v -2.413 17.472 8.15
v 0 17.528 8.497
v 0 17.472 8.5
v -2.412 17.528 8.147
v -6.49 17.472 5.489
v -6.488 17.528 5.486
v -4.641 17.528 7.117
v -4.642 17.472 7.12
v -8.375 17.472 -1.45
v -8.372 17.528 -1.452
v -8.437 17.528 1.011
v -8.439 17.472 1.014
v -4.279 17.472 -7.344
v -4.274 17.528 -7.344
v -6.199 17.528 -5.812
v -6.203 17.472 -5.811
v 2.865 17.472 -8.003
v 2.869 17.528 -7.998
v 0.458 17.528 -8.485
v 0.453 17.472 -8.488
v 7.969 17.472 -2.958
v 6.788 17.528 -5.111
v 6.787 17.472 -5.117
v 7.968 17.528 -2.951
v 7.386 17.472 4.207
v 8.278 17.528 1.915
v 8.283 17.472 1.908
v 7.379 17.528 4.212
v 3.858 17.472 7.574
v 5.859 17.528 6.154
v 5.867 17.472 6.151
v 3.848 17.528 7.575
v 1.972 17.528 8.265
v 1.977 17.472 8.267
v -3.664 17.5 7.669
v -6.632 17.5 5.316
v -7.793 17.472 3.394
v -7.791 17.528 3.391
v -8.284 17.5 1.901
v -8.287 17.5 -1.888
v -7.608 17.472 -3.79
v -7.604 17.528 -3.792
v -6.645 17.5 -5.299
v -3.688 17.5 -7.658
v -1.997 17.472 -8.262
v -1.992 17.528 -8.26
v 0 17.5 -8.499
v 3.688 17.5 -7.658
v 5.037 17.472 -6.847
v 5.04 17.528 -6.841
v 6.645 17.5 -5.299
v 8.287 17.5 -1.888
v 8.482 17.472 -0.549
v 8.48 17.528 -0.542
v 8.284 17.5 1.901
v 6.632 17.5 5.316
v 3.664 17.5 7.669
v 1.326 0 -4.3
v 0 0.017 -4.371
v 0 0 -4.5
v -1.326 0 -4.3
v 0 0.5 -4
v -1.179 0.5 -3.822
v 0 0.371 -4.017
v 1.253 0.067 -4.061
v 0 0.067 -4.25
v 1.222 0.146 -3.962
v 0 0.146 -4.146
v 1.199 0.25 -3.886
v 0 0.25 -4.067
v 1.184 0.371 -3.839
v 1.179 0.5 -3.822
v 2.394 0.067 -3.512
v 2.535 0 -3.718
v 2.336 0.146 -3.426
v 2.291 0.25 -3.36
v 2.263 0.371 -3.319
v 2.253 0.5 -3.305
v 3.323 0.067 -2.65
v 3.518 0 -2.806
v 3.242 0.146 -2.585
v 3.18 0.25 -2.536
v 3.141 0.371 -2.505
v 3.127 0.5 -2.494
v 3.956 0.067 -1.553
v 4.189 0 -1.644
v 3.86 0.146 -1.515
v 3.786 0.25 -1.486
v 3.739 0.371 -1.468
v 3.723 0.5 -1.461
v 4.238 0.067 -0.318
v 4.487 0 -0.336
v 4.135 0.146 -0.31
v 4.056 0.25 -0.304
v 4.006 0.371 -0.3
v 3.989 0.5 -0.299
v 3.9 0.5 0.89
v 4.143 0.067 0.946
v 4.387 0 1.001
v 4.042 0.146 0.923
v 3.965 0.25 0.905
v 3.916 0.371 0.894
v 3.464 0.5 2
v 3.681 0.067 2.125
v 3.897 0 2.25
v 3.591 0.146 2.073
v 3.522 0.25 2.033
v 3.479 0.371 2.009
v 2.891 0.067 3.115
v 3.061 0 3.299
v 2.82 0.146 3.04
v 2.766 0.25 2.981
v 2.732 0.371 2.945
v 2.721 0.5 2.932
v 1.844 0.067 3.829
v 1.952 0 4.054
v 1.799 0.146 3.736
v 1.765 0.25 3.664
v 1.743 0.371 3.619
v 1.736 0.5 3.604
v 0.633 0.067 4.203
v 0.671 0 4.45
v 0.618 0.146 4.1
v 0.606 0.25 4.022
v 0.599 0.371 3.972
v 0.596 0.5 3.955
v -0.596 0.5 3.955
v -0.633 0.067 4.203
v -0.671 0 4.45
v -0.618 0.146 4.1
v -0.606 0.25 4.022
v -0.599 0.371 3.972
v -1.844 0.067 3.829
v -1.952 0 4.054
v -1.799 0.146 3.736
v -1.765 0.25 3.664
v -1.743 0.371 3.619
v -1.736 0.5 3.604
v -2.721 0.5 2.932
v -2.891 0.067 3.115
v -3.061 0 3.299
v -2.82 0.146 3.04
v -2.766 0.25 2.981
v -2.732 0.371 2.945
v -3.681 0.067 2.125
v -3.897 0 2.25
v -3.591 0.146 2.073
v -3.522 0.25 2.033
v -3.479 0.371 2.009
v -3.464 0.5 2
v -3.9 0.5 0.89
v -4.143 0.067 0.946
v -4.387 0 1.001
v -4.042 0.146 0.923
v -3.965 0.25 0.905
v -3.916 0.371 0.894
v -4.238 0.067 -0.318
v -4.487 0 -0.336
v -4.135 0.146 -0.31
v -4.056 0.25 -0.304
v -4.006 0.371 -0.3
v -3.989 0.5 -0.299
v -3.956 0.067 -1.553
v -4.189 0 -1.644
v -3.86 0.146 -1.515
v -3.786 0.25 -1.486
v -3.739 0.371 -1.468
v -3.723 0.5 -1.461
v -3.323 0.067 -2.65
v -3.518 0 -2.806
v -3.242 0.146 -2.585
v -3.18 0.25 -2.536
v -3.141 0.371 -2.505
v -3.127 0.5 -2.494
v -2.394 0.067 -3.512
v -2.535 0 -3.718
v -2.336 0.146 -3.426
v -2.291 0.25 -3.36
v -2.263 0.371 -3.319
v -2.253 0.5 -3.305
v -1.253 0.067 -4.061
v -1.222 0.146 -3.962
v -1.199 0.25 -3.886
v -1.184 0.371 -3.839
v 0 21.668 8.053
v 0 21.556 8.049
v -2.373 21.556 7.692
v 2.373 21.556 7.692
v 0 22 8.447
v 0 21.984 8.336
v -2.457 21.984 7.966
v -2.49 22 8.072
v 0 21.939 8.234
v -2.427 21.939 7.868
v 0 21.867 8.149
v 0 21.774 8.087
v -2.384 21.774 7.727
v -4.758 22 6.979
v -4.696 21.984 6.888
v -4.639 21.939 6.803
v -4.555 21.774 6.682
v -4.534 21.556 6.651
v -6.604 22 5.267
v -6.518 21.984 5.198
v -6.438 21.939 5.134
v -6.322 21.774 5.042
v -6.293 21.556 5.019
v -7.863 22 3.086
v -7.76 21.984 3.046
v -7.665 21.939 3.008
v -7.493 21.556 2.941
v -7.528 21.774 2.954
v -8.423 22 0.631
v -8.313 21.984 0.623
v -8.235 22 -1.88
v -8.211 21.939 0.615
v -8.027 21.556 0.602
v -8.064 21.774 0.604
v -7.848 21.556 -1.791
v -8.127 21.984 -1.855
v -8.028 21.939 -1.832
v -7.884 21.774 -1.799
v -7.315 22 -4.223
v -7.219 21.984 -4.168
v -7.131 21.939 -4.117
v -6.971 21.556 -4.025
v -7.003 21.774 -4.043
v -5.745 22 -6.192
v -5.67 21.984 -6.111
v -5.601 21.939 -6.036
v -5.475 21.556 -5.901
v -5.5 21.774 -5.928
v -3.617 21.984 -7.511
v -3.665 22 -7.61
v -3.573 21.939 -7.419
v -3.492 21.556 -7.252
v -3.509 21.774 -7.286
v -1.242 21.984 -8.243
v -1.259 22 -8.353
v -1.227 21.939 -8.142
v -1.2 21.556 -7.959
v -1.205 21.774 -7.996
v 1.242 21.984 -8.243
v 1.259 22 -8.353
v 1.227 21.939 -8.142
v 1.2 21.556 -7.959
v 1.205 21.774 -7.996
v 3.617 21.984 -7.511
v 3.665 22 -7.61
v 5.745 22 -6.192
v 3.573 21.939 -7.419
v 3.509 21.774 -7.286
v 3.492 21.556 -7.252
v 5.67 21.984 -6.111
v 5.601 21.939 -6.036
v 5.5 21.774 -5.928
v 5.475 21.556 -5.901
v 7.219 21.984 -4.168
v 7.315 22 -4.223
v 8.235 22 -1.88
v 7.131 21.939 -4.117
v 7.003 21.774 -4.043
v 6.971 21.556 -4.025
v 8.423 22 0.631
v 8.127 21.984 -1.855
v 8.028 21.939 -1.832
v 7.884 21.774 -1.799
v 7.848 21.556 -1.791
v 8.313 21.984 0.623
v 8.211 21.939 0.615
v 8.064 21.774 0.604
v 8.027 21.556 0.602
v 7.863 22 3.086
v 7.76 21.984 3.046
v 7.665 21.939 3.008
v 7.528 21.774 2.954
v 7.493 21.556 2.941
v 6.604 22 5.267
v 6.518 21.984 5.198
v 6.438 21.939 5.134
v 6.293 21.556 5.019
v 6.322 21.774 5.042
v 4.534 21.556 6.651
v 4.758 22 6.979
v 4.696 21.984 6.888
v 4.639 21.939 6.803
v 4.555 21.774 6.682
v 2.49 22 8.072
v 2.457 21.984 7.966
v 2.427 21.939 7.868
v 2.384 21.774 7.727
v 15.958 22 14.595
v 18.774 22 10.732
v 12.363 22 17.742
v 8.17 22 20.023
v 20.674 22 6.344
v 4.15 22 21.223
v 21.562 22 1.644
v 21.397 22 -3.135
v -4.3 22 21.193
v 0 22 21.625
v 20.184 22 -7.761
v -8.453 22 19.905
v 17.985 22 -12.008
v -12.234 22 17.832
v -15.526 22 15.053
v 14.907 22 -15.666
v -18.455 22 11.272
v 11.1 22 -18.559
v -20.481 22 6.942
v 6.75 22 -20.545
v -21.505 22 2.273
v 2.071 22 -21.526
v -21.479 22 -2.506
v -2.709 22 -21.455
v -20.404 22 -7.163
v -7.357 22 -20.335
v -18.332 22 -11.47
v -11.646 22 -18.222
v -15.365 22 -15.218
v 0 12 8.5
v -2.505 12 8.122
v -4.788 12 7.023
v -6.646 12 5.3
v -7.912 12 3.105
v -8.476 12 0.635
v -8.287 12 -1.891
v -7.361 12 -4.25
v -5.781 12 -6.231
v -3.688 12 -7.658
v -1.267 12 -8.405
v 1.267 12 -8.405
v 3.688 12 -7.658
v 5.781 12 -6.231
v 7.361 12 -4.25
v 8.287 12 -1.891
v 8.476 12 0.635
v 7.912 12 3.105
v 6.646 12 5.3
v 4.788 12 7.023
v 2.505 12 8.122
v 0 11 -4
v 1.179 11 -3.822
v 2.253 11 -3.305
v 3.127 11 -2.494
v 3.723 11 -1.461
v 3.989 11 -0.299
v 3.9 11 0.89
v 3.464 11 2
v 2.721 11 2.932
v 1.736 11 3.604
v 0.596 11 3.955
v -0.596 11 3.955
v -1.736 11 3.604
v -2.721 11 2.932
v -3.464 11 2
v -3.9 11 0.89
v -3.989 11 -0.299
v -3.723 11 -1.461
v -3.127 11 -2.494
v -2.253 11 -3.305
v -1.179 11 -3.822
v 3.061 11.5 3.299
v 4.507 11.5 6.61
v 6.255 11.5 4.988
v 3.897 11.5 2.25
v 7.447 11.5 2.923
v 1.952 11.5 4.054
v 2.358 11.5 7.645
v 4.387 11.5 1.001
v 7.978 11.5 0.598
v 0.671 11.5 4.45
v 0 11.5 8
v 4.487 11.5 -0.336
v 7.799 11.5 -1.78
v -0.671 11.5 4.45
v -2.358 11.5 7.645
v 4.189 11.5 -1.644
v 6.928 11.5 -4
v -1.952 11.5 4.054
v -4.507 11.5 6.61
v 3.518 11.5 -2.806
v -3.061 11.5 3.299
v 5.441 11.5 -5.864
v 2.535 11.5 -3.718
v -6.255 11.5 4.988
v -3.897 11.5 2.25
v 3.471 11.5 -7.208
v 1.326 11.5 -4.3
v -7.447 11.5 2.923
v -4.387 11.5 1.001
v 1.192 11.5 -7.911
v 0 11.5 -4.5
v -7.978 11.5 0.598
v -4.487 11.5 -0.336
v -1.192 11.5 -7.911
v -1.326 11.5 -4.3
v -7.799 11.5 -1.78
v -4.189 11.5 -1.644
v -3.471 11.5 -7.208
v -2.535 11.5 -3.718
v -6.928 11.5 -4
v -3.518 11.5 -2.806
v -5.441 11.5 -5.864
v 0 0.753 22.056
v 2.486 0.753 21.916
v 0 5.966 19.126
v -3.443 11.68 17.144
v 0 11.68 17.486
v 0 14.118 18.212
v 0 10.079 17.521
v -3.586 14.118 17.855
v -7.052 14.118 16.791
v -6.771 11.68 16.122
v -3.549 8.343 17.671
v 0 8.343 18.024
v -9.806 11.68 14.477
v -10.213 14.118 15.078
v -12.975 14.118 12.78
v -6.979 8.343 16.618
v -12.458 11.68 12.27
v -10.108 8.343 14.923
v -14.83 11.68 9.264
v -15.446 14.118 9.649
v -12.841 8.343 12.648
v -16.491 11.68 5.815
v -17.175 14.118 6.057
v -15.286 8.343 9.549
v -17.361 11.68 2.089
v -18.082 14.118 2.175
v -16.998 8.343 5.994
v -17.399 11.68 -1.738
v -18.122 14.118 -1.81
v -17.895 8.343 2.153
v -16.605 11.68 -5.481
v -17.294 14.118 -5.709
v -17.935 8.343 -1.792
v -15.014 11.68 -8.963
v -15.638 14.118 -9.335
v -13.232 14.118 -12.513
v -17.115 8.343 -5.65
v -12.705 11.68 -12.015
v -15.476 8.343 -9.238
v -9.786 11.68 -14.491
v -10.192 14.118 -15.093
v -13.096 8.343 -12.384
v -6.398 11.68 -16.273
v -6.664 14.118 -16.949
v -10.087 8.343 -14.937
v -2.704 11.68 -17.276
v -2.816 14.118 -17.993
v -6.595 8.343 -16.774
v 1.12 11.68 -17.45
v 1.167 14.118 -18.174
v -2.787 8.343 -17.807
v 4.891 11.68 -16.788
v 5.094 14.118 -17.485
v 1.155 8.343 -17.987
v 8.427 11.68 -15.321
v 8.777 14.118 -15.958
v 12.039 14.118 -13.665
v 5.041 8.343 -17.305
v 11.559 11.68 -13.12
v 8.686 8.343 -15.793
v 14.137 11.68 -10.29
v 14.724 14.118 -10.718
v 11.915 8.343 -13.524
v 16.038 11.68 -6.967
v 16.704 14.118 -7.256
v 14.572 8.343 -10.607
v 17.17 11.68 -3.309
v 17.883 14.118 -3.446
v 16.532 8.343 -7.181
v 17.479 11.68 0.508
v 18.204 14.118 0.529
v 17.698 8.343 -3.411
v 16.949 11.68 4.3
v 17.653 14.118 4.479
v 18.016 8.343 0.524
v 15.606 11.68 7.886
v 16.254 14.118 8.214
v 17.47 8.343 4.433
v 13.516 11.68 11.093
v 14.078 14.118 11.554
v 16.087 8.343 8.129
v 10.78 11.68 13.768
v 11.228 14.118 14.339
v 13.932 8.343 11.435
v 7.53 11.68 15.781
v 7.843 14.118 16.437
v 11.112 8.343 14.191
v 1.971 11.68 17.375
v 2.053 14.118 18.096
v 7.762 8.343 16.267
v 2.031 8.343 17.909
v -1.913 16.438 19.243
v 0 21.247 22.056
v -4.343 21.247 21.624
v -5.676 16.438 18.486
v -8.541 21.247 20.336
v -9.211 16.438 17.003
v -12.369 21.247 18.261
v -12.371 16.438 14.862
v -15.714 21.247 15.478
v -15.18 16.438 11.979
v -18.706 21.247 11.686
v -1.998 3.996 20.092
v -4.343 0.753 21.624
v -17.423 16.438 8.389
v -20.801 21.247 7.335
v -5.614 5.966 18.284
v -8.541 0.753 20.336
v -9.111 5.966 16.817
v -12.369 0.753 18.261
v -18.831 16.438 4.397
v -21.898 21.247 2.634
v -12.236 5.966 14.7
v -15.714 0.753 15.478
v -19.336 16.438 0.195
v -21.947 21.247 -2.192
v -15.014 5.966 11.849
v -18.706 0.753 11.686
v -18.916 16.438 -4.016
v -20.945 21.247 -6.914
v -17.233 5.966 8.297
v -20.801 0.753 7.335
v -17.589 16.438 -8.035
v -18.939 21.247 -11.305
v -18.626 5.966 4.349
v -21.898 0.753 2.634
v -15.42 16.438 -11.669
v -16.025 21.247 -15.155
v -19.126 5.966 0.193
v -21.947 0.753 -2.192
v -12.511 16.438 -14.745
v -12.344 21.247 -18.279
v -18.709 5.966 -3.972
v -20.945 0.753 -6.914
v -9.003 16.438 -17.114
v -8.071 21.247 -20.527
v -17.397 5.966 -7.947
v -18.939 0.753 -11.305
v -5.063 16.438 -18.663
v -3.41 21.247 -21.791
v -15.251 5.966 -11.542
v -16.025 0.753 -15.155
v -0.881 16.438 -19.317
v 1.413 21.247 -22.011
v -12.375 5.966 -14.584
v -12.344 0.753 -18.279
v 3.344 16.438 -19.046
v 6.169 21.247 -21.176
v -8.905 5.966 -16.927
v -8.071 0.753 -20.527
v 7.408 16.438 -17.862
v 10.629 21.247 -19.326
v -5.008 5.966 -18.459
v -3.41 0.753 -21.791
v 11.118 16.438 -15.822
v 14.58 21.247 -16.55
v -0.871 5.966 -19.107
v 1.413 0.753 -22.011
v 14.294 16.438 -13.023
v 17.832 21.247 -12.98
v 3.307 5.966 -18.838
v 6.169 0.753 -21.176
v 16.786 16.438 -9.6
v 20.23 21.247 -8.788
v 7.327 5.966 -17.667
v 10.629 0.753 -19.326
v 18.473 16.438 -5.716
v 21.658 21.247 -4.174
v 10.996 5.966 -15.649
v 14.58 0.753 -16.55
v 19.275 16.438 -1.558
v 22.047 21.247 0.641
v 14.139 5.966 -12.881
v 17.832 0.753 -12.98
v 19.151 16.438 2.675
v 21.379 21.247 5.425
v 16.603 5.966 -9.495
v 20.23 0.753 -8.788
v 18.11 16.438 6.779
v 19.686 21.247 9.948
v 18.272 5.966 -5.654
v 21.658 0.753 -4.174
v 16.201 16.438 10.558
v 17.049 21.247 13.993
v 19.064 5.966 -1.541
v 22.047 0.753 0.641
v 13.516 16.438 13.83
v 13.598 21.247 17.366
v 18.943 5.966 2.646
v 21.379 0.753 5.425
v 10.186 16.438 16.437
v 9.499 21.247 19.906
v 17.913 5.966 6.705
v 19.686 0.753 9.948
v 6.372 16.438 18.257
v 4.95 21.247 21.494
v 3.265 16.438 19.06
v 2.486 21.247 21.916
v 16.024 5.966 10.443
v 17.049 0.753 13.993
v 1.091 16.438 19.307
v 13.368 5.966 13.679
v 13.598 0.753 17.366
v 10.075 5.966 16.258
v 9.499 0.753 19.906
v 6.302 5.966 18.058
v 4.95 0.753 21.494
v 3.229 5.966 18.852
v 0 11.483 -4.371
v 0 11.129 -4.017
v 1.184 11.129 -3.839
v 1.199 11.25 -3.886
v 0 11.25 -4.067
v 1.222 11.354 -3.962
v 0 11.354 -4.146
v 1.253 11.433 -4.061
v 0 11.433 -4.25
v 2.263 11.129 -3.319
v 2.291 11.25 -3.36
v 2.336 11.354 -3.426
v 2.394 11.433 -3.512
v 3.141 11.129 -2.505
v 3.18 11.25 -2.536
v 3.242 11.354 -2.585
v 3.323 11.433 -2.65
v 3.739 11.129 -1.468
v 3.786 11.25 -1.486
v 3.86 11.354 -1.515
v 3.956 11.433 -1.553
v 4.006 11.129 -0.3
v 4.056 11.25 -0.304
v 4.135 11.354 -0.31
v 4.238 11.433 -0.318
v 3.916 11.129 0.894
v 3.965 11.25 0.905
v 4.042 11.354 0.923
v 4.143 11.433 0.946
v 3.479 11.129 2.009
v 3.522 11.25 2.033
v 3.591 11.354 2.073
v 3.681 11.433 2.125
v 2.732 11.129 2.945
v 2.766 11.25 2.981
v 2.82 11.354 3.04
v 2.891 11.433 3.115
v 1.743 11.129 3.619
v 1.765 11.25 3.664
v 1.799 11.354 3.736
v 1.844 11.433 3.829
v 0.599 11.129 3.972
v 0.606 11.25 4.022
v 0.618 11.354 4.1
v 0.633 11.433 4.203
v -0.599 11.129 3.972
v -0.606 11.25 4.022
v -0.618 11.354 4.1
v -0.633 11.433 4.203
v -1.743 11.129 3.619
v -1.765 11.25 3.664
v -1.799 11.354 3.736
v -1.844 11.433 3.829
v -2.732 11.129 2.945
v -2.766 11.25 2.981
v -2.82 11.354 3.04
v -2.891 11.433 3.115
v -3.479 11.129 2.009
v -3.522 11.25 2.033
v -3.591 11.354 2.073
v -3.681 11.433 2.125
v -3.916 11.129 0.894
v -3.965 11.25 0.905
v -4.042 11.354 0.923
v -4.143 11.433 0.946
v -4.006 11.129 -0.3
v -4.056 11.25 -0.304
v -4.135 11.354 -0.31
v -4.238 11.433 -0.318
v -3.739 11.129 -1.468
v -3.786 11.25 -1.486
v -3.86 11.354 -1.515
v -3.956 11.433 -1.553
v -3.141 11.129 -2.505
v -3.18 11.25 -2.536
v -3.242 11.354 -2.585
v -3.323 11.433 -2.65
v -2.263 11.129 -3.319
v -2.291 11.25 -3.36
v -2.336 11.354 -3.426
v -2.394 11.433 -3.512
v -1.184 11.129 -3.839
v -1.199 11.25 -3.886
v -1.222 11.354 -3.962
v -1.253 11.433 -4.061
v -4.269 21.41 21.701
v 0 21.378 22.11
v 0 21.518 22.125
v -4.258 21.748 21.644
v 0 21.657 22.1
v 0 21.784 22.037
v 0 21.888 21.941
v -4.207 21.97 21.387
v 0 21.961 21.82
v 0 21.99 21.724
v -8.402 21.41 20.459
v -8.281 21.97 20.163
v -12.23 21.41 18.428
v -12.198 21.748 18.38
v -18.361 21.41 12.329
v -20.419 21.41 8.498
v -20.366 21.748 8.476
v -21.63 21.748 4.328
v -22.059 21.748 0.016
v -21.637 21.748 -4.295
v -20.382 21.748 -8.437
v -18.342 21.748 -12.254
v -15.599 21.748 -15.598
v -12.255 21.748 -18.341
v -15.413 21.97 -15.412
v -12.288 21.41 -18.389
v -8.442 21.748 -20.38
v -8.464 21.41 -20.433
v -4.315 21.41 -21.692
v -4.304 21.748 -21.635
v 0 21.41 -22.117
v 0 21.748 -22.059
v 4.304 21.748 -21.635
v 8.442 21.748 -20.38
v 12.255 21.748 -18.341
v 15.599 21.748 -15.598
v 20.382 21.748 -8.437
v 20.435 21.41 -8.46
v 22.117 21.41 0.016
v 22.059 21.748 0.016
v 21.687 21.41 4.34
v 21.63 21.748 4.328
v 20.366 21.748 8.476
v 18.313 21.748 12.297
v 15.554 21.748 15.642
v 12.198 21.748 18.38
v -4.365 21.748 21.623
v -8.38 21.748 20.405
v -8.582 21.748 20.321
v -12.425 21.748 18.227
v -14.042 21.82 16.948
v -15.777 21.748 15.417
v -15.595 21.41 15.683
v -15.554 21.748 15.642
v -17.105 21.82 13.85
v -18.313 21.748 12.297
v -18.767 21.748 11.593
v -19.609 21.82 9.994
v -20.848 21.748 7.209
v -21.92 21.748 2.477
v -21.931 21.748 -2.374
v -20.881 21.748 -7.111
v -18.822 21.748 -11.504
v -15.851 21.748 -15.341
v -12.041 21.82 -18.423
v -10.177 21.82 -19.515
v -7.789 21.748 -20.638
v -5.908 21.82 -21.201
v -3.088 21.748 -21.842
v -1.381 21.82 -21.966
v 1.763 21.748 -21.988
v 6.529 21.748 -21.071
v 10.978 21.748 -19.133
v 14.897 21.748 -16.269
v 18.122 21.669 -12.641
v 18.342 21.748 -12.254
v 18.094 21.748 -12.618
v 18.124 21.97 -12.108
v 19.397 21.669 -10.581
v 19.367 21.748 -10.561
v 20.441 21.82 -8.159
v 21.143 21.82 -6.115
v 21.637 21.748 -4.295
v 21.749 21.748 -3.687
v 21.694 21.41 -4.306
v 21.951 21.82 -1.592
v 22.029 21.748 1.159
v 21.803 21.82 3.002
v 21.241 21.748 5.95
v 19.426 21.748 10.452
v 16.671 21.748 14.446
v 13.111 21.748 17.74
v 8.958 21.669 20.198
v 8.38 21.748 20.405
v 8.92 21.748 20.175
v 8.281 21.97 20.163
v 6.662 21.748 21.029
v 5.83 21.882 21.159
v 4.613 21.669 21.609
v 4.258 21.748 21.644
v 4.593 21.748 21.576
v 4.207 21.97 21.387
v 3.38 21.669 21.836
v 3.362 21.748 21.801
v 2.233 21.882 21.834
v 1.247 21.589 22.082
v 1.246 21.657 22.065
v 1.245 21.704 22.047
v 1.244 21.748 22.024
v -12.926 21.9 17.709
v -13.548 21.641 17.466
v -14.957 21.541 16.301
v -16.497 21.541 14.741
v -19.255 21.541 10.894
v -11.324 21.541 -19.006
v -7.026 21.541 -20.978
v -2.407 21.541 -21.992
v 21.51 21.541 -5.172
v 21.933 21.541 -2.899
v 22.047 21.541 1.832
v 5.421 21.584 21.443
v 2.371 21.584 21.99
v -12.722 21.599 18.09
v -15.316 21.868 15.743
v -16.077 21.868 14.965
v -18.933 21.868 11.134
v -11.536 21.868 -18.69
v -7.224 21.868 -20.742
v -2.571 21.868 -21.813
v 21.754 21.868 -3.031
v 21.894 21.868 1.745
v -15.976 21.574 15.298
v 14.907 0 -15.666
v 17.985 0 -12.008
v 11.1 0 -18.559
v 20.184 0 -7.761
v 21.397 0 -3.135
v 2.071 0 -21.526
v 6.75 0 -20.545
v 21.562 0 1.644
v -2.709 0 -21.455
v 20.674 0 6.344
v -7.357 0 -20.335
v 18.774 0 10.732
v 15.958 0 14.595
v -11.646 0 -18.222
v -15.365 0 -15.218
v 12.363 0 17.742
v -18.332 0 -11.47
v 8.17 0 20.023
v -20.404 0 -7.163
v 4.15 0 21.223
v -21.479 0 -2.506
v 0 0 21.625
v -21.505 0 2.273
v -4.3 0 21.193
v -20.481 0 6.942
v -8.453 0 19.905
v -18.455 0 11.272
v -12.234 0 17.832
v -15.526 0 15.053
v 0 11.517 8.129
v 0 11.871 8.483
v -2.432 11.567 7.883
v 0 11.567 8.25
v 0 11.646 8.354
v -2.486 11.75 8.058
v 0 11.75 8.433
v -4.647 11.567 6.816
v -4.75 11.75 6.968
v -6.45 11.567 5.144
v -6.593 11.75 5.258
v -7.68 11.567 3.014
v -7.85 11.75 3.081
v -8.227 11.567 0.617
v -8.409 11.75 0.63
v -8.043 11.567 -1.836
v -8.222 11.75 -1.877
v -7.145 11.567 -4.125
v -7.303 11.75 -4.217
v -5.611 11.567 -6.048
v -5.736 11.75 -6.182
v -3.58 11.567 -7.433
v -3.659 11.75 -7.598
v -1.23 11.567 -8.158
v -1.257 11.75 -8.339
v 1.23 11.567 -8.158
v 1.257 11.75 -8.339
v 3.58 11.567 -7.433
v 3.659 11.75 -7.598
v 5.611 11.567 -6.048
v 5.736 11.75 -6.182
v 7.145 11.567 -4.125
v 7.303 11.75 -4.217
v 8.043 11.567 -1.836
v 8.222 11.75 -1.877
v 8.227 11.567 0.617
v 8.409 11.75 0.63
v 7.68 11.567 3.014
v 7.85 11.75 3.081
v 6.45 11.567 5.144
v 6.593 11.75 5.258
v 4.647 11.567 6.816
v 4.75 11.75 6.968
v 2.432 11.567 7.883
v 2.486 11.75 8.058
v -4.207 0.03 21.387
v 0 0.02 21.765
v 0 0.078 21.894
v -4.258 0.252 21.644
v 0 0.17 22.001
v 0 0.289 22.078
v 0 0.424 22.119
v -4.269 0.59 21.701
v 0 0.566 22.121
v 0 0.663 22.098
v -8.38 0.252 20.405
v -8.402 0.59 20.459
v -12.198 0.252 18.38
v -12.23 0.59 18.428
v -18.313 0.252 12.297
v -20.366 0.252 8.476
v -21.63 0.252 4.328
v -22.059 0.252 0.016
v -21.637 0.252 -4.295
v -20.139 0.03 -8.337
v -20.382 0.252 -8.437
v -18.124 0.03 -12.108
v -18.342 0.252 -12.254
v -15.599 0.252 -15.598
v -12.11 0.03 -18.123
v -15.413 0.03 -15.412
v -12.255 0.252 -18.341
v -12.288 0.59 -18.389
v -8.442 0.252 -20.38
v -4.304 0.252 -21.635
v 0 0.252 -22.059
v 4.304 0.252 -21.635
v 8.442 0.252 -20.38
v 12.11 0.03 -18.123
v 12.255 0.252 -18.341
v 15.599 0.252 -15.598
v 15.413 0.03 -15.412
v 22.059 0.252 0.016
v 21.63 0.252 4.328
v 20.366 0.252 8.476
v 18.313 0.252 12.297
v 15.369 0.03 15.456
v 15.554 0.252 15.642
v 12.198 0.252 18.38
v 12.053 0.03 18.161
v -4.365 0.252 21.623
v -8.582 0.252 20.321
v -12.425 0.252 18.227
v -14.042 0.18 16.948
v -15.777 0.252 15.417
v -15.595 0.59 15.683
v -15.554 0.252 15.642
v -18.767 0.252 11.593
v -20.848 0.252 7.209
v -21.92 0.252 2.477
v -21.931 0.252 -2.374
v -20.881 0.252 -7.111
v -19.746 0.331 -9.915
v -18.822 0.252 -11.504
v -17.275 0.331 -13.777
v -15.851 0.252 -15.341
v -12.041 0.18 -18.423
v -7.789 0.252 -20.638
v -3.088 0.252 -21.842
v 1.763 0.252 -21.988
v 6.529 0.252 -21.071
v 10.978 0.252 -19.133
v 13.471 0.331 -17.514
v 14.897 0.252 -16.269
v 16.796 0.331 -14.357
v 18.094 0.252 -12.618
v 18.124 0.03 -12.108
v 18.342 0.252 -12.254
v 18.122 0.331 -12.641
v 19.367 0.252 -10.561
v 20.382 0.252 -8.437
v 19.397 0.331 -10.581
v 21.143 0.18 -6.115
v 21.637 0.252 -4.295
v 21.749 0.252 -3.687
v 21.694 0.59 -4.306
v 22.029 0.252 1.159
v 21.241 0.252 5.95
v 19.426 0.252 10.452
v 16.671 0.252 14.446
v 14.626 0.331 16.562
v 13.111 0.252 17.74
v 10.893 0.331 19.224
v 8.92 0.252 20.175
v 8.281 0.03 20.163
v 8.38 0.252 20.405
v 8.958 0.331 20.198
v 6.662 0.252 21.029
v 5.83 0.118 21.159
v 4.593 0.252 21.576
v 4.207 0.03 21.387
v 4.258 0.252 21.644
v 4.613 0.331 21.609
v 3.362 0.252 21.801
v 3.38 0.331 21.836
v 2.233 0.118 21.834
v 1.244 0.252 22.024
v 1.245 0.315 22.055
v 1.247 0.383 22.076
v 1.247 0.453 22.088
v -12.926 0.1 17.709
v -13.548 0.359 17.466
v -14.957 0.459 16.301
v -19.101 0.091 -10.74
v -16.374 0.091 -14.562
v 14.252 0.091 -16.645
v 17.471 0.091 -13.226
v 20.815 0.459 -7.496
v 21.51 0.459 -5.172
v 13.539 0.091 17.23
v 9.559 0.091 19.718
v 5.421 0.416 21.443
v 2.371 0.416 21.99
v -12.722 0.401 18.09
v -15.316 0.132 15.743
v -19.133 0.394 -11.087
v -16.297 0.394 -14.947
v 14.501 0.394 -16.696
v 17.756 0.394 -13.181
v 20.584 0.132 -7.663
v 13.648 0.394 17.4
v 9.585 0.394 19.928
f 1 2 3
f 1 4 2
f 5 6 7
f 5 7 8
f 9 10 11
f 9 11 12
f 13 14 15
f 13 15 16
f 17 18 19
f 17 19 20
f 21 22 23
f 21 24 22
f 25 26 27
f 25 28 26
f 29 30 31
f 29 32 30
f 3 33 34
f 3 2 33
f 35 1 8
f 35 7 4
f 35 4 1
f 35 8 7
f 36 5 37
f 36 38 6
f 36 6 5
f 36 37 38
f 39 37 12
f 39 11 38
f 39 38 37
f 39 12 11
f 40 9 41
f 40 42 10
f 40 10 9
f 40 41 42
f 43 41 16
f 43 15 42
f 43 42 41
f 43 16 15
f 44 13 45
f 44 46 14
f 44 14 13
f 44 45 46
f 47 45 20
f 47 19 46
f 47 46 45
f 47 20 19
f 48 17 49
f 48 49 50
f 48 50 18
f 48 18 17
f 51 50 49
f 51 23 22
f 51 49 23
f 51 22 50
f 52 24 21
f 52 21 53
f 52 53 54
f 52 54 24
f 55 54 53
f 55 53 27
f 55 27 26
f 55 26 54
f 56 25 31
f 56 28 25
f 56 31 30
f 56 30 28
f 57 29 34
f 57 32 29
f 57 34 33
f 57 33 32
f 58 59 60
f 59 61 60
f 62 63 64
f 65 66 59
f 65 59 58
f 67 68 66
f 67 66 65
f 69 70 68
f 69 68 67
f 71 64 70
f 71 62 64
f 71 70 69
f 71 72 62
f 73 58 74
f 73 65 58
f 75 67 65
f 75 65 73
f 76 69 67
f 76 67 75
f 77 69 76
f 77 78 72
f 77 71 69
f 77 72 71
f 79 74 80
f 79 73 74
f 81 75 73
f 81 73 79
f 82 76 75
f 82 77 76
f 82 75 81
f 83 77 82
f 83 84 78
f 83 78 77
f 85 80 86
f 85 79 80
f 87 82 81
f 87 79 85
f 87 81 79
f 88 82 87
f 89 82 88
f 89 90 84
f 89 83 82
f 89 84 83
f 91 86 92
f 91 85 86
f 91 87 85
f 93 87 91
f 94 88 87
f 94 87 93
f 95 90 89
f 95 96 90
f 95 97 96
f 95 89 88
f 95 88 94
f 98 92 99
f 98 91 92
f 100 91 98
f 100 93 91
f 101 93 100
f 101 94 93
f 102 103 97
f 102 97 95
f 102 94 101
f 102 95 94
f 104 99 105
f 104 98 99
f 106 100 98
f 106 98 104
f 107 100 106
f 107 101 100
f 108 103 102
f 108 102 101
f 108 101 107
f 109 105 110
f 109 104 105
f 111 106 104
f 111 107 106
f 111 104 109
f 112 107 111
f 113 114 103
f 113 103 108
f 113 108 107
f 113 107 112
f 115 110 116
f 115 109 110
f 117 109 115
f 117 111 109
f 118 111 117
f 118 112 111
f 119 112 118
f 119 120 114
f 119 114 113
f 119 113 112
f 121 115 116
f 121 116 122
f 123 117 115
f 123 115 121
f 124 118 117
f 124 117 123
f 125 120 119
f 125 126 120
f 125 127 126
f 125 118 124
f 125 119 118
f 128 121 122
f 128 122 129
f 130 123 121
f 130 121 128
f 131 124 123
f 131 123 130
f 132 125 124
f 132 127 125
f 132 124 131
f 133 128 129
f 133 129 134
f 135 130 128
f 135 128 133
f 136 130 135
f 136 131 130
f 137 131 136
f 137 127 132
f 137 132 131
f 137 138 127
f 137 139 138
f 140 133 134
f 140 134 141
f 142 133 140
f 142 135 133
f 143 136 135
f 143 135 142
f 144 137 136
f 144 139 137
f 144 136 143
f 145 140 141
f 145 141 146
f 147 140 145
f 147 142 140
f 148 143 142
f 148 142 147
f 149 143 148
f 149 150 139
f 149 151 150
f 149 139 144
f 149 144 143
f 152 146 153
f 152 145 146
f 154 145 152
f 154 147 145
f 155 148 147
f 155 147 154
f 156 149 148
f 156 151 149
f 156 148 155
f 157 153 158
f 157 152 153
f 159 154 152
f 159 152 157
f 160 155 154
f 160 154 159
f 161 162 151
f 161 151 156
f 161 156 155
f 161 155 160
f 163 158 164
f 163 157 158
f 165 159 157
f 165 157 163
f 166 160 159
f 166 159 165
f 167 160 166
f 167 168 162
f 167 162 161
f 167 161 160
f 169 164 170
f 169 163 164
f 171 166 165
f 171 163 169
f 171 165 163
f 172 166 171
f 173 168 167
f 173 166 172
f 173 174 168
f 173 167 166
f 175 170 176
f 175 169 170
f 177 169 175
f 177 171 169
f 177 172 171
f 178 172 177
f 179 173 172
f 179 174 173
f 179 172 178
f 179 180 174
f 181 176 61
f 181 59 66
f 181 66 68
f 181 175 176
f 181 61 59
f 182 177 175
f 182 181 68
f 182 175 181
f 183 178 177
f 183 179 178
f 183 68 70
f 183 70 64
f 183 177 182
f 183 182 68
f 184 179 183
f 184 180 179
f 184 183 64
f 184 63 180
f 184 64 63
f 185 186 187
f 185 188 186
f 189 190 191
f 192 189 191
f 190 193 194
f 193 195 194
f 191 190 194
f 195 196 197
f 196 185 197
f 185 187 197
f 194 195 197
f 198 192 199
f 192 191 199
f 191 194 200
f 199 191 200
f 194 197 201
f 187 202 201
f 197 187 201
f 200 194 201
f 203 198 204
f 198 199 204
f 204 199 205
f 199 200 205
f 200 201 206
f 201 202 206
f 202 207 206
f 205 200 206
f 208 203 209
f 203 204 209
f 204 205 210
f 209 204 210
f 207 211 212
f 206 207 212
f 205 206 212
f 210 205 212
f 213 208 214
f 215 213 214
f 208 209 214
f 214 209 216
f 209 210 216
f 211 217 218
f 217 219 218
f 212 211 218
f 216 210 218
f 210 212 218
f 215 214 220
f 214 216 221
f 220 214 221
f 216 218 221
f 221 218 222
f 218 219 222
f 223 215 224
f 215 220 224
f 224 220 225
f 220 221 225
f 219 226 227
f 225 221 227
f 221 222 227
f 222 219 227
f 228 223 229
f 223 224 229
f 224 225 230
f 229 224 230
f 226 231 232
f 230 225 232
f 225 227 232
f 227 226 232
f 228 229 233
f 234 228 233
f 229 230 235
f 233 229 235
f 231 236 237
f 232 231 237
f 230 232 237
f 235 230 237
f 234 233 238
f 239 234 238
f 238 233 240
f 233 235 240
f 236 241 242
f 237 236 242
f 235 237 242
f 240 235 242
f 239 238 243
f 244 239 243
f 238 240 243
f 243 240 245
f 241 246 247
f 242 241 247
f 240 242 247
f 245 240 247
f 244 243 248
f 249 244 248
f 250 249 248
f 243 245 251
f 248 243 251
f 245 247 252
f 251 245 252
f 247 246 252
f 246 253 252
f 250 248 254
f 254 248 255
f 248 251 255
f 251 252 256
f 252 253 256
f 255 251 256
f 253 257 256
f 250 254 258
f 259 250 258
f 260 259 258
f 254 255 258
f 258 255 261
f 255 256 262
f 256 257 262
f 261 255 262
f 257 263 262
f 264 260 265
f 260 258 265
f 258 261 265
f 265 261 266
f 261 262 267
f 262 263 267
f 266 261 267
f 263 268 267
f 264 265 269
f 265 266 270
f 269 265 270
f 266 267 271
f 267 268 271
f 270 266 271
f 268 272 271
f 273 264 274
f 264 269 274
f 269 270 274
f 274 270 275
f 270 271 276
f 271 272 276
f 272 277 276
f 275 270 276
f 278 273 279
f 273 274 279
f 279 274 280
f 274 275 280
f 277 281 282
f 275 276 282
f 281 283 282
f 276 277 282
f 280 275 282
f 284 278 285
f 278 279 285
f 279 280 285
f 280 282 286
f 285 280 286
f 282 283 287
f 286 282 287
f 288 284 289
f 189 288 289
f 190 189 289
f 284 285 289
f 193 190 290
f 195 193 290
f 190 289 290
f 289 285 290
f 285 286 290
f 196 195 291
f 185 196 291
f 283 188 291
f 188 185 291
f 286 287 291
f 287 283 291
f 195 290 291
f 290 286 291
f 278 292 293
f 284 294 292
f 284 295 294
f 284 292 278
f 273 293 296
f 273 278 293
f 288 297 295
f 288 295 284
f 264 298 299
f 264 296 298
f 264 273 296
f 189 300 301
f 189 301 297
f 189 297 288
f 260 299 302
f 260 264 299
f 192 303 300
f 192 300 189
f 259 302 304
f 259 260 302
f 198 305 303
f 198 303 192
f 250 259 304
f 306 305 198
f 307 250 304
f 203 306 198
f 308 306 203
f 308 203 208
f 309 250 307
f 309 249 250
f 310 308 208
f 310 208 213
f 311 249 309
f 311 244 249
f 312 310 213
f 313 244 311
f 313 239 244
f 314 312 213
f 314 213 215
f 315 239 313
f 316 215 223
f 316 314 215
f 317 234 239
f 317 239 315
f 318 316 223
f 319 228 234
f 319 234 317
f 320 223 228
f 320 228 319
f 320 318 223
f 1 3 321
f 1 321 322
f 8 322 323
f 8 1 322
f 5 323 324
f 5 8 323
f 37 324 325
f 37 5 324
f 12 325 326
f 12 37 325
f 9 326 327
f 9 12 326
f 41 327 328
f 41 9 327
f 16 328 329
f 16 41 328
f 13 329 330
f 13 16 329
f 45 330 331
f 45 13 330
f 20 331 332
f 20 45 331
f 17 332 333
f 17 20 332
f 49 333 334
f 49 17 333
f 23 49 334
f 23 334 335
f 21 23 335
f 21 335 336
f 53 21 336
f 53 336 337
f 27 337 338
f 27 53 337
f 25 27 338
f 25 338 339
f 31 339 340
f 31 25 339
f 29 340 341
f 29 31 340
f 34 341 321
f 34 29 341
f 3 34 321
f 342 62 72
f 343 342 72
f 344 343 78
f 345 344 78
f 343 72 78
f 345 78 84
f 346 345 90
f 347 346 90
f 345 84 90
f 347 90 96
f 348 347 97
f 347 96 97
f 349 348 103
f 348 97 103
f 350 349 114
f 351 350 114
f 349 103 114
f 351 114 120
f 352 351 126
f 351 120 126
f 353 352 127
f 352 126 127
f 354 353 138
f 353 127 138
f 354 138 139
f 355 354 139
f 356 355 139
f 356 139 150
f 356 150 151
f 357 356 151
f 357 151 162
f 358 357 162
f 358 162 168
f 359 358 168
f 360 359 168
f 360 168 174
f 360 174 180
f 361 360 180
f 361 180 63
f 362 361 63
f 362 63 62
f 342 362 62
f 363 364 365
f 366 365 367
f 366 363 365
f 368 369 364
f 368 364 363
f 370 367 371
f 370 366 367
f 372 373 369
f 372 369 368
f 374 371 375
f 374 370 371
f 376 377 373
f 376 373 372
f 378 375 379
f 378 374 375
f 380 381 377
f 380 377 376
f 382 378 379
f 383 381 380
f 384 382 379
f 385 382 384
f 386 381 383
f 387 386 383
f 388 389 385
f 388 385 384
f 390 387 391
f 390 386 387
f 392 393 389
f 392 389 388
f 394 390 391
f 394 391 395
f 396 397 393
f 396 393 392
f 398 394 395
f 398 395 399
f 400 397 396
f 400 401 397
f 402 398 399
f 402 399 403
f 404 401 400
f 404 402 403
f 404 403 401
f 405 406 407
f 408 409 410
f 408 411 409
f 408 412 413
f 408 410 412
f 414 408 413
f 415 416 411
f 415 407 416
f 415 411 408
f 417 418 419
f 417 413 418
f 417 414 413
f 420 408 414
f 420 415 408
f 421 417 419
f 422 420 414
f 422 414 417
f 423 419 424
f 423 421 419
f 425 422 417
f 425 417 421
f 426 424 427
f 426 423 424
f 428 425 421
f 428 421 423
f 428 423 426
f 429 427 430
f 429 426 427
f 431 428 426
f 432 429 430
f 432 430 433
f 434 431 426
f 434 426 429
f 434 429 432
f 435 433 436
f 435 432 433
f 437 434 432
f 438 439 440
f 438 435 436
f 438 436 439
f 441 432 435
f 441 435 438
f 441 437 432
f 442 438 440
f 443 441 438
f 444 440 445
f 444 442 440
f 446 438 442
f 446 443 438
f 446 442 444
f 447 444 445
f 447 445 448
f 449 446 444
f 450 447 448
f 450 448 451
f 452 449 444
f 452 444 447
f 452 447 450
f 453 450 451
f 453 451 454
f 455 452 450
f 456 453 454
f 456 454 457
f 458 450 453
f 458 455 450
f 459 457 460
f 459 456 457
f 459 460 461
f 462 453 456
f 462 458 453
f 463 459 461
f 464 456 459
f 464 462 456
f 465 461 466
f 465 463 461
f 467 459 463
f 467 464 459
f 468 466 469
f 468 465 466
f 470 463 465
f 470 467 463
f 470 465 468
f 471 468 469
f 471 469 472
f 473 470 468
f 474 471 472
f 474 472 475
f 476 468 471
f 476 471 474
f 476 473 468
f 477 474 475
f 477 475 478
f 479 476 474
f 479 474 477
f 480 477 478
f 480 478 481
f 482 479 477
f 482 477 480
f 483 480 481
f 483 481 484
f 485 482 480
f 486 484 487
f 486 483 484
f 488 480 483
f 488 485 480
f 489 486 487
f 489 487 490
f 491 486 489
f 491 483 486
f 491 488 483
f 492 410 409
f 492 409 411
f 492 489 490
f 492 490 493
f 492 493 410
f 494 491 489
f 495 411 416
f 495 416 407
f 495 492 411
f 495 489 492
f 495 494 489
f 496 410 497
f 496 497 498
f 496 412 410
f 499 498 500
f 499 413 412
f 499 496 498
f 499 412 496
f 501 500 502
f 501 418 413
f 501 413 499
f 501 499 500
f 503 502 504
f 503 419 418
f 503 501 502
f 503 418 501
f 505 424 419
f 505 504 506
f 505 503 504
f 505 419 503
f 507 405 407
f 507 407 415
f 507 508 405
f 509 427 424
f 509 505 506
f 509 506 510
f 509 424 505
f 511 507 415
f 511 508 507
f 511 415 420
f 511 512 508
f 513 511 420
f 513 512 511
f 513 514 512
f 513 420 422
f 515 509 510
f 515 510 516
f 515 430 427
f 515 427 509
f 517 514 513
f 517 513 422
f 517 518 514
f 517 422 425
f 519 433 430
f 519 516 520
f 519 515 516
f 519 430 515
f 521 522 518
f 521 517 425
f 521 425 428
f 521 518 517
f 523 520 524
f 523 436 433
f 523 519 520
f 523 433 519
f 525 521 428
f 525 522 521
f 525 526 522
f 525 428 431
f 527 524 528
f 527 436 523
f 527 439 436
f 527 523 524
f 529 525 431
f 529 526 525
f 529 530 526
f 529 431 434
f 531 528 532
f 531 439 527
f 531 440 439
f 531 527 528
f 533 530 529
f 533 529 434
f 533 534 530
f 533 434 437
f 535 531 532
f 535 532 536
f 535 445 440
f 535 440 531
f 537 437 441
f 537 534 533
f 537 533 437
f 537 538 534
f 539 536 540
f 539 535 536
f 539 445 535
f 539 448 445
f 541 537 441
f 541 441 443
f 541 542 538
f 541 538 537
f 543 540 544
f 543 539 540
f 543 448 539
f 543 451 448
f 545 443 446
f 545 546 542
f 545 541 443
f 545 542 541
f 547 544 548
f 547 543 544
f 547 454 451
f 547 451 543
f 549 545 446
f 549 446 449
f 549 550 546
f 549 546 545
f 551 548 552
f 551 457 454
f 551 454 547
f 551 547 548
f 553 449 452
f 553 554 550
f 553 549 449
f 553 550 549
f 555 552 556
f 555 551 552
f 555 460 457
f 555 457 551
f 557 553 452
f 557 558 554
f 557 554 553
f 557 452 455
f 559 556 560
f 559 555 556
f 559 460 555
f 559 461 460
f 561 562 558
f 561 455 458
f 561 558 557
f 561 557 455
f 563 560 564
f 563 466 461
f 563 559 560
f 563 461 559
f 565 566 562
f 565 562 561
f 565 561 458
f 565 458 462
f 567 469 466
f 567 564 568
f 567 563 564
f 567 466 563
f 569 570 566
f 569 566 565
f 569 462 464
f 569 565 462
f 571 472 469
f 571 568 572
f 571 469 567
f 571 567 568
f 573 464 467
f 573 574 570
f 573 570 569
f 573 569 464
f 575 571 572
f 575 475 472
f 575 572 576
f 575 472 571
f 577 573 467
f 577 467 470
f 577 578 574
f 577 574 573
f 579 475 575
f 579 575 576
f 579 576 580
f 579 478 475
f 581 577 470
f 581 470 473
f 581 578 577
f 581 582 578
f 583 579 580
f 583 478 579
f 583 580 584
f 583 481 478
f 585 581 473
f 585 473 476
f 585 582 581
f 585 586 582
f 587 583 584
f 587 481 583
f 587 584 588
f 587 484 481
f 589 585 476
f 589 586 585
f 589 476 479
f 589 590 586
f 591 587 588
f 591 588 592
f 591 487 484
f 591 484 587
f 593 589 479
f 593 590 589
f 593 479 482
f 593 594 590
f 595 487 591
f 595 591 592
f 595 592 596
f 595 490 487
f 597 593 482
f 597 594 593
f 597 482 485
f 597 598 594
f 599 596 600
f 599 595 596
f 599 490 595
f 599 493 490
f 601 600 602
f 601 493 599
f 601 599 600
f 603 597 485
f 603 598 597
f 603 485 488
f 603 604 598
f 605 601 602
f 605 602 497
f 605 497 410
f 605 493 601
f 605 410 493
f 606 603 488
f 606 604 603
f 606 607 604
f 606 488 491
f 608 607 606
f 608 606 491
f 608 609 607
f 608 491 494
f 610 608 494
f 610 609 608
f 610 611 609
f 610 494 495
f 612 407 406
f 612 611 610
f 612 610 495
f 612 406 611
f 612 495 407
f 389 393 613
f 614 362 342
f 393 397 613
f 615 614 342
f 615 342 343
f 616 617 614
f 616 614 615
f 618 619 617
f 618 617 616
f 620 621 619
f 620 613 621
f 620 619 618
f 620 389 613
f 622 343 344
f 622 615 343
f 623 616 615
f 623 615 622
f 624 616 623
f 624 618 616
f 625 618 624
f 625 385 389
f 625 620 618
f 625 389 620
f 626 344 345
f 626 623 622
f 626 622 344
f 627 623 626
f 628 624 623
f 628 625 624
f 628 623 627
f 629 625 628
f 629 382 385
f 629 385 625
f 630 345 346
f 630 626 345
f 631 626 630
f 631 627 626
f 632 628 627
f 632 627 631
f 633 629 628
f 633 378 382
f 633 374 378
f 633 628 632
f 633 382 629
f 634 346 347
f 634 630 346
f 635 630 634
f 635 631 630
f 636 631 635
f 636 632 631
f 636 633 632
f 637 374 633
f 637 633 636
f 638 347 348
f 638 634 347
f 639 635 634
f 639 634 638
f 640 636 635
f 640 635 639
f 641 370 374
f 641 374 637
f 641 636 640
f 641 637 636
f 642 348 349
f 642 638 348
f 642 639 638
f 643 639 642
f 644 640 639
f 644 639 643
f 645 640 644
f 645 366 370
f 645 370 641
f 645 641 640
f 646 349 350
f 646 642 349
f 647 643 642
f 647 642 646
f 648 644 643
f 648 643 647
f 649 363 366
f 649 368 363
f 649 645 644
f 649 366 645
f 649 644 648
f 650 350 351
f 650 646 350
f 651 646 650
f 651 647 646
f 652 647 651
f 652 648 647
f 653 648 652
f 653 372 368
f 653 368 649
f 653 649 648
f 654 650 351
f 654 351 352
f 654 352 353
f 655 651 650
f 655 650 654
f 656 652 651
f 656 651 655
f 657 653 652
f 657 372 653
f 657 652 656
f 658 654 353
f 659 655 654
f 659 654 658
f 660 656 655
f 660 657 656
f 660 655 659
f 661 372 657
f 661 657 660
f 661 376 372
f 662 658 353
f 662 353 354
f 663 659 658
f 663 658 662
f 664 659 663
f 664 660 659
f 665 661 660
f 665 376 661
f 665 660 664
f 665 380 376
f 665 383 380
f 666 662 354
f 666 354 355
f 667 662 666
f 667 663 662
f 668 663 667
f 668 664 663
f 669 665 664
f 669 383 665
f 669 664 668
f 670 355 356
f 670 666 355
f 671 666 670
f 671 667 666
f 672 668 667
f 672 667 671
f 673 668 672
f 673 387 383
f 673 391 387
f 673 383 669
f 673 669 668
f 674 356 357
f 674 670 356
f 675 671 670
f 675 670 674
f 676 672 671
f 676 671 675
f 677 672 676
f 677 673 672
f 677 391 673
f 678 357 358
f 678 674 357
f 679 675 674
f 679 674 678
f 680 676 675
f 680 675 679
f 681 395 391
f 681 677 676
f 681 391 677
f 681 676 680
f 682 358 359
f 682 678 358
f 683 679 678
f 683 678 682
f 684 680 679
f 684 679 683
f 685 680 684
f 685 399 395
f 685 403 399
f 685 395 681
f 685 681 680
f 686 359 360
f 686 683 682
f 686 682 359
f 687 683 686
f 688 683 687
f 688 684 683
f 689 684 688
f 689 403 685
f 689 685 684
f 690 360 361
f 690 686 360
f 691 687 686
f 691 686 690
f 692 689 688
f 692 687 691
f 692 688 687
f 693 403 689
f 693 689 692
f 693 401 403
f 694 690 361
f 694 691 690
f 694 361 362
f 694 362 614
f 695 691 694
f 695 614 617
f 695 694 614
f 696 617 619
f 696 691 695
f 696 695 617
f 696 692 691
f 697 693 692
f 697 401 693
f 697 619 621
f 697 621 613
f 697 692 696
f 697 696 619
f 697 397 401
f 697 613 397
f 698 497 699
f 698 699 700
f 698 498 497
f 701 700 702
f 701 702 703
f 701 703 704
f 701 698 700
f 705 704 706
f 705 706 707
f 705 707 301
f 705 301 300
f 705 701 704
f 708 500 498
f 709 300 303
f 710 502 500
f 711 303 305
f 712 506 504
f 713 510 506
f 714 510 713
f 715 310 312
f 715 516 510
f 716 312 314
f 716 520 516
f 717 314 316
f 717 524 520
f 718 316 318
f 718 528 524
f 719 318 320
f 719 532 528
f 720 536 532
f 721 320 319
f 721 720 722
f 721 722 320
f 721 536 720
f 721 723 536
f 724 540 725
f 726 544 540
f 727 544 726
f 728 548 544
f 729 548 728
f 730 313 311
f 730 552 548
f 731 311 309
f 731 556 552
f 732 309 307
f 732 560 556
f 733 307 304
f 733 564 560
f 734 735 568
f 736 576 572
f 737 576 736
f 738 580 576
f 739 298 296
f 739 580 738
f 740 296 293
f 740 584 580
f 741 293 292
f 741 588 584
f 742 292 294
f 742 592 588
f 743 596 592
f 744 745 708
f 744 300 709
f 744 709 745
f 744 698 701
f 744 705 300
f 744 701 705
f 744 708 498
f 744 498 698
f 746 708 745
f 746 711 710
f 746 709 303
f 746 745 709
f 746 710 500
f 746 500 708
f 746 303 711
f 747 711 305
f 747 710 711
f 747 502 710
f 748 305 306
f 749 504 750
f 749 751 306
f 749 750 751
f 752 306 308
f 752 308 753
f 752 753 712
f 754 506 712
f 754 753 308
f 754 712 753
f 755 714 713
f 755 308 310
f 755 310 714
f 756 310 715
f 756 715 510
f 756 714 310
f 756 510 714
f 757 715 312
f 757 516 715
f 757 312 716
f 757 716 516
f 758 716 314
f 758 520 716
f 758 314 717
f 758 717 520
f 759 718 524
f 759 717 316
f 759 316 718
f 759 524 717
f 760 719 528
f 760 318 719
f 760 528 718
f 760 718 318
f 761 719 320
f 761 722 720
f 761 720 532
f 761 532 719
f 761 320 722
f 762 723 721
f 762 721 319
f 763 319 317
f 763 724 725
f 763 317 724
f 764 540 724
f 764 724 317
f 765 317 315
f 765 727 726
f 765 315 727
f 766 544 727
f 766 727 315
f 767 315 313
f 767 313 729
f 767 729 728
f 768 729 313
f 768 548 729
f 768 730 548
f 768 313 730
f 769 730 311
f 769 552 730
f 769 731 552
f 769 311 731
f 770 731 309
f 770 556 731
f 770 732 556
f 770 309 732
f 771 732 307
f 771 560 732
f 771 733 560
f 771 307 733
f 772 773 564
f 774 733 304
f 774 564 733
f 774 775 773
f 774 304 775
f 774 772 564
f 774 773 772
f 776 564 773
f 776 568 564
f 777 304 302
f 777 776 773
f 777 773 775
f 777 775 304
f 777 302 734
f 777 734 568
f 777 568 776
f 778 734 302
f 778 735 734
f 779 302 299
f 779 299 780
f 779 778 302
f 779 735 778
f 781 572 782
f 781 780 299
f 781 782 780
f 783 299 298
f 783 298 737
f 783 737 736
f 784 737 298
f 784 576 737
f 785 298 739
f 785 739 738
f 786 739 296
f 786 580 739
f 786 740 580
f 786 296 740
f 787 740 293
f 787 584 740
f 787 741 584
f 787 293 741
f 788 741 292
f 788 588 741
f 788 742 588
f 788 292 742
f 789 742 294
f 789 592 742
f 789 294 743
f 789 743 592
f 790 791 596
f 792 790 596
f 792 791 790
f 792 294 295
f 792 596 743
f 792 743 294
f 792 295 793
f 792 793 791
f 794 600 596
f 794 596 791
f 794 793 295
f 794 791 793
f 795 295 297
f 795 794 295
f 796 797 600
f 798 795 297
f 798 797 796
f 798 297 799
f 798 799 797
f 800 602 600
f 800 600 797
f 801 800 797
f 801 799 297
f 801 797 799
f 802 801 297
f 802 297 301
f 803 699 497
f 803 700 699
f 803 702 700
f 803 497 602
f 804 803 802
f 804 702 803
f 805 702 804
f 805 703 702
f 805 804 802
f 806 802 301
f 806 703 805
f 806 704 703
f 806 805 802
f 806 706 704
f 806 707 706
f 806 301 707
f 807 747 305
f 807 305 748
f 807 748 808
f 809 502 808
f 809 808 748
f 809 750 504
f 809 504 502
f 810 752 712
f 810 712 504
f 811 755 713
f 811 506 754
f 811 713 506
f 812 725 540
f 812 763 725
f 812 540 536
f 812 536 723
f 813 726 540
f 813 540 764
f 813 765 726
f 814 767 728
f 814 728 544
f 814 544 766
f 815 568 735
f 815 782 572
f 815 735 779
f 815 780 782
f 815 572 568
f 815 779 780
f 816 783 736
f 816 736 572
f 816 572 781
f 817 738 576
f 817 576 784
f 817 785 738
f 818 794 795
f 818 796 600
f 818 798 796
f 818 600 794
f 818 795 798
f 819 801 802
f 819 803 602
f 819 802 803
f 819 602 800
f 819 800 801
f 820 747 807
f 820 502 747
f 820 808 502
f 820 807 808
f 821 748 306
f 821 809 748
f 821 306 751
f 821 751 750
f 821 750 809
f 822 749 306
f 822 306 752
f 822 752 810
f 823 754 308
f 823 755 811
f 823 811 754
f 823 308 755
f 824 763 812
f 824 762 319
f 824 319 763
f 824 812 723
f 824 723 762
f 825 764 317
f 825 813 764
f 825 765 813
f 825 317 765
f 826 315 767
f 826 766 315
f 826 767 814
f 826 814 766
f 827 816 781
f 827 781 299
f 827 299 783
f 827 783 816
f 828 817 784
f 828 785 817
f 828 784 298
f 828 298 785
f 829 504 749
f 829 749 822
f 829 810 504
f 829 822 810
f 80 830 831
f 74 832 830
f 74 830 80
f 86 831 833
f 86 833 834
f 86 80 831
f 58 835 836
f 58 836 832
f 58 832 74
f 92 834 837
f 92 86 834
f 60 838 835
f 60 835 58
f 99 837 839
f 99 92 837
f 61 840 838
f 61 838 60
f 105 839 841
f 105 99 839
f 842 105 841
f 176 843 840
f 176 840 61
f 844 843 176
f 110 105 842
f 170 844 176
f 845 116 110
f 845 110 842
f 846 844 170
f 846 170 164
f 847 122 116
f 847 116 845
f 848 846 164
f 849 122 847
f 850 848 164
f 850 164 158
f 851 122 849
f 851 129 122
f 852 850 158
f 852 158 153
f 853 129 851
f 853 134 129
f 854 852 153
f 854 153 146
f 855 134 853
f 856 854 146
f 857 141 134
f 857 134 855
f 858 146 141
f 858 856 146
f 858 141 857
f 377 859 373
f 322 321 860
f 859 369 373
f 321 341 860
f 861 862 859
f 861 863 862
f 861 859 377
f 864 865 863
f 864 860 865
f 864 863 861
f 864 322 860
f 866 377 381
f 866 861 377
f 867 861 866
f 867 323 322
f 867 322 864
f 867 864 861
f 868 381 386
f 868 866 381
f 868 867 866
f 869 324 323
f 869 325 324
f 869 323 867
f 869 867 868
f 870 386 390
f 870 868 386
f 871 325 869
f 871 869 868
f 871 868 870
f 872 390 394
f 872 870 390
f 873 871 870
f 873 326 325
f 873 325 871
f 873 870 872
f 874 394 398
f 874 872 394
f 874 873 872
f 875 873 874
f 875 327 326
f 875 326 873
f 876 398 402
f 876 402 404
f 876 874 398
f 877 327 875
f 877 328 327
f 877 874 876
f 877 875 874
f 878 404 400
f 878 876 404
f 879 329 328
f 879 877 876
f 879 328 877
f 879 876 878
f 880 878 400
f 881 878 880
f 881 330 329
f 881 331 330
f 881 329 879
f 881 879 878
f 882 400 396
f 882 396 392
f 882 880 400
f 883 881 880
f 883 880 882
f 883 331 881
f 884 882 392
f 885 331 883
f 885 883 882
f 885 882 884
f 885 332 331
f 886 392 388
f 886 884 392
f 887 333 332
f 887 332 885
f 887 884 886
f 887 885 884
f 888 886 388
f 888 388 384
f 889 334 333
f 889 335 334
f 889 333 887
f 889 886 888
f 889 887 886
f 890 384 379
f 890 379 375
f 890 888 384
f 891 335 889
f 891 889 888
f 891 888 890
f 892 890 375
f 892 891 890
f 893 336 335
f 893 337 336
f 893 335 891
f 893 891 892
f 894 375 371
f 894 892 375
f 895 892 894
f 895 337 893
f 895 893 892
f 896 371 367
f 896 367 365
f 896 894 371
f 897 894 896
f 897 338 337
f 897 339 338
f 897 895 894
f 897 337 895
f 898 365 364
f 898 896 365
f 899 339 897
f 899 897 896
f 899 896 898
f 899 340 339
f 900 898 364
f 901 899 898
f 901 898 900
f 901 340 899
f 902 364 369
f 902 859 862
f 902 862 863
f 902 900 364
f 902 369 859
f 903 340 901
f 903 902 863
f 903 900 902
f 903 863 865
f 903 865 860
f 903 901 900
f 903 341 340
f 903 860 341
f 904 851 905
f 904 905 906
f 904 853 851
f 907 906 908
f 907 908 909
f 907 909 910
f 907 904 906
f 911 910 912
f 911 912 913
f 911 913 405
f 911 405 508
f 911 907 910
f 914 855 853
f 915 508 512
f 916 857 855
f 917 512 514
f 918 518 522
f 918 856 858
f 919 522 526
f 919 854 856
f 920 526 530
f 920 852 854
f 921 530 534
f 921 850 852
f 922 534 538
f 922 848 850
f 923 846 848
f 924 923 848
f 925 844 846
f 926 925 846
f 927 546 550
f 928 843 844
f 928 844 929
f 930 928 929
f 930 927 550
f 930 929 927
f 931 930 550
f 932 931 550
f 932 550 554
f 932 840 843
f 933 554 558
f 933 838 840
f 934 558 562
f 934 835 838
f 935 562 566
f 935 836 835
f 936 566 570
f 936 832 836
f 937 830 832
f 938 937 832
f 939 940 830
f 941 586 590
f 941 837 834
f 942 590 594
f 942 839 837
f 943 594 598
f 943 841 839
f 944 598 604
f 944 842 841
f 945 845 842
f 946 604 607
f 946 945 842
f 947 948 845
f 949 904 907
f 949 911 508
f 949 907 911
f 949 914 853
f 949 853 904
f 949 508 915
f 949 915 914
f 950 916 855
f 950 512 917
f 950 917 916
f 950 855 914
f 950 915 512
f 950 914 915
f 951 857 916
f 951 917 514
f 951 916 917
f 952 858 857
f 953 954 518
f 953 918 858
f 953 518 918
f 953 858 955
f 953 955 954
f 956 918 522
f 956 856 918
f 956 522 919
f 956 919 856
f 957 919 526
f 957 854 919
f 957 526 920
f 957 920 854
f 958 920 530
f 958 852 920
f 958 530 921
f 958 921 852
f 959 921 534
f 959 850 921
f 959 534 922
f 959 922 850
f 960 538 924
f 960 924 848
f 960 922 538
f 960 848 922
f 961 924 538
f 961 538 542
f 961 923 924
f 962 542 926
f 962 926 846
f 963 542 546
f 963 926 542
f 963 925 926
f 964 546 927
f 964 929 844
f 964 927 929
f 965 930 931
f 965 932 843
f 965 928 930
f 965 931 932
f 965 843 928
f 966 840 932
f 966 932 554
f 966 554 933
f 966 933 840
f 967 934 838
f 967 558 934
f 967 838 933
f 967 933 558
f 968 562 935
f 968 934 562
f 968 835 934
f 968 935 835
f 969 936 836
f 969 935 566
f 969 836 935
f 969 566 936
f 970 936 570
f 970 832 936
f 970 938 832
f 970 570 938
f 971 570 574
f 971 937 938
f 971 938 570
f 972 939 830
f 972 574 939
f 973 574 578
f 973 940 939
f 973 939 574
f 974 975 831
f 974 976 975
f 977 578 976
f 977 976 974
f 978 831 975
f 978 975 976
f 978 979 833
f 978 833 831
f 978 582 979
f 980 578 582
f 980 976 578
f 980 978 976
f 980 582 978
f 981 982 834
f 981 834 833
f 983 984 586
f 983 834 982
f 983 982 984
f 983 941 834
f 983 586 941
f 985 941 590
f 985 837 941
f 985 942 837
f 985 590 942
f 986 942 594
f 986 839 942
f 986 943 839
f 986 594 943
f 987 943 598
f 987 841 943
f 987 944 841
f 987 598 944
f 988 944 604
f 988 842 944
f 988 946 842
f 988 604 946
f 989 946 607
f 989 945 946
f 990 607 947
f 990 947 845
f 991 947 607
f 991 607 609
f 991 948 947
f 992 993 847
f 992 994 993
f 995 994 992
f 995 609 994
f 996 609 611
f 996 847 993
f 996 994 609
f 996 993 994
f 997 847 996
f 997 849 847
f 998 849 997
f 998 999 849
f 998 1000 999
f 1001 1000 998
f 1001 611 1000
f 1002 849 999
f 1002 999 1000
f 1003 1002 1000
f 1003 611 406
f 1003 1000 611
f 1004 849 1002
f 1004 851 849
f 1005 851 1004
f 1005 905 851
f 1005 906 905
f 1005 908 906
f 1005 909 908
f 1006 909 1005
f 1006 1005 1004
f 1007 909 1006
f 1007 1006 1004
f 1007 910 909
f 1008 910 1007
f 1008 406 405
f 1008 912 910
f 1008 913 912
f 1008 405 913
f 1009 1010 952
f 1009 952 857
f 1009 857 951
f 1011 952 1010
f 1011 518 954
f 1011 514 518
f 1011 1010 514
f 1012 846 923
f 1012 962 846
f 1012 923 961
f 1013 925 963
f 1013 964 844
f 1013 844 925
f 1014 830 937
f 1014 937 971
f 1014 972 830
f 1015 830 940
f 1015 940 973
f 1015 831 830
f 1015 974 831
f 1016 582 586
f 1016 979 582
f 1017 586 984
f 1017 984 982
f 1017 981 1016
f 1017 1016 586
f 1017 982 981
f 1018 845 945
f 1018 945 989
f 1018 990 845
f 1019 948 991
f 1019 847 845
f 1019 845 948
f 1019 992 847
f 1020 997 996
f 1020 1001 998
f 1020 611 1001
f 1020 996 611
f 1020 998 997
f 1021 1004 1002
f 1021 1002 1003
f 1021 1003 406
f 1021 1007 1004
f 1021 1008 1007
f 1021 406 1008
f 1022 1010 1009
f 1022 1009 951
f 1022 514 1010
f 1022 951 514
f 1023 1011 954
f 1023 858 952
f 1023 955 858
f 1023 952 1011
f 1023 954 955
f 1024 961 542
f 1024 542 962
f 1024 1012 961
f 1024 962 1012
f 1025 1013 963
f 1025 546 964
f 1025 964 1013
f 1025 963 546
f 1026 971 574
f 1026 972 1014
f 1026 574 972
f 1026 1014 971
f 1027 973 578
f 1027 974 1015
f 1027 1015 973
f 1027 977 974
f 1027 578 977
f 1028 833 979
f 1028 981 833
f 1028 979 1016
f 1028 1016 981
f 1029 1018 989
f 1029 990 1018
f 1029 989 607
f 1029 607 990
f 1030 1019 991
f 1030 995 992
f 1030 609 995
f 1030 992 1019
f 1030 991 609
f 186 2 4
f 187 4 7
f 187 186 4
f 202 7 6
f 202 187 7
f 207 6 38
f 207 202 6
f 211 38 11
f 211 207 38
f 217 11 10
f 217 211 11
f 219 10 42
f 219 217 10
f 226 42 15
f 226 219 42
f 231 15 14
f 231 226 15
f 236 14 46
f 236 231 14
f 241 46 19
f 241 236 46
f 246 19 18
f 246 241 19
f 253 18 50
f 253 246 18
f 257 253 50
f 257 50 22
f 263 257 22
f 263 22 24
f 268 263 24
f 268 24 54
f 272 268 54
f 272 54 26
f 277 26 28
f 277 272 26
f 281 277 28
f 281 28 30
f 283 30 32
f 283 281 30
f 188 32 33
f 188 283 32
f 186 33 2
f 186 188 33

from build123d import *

# Parameters (mm, degrees)
SKETCH2_R          = 4
CUT_EXTRUDE1_DEPTH = 39.684622441
FILLET1_R          = 0.5
FILLET2_R          = 0.4


with BuildPart() as part:
    # Sketch1 → Revolve1 (revolve)
    with BuildSketch(Plane(origin=(0, 0, 0), x_dir=(0, 0, -1), z_dir=(1, 0, 0))):
        with BuildLine():
            Line((-22.5, 0), (0, 0))
            Line((0, 0), (0, 11.5))
            Line((0, 11.5), (-8.5, 11.5))
            Line((-8.5, 11.5), (-8.5, 17.5))
            Line((-8.5, 17.5), (-8, 22))
            Line((-8, 22), (-22.5, 22))
            add(Edge.make_bspline(
                [(-22.5, 22), (-16, 11), (-22.5, 0)],
                knots=[0, 0, 0, 1, 1, 1], degree=2, weights=[1, 3.505030536, 1]))
        make_face()
    revolve(axis=Axis((0, 39.130434783, 0), (0, -1, 0)))

    # Sketch2 → Cut-Extrude1 (cut, through all)
    with BuildSketch(Plane.XZ):
        Circle(SKETCH2_R)
    extrude(amount=-CUT_EXTRUDE1_DEPTH, mode=Mode.SUBTRACT)

    # Fillet1
    fillet1_edges = [part.edges().sort_by_distance(p)[0] for p in [
        (-4, 11.5, 0),
        (-4, 0, 0),
        (0, 11.5, -8.5),
        (0, 17.5, -8.5),
        (0, 0, -22.5),
        (0, 22, -22.5),
    ]]
    fillet(fillet1_edges, radius=FILLET1_R)

    # Fillet2
    fillet2_edges = [part.edges().sort_by_distance(p)[0] for p in [
        (0, 22, -8),
    ]]
    fillet(fillet2_edges, radius=FILLET2_R)


solid = part.part
